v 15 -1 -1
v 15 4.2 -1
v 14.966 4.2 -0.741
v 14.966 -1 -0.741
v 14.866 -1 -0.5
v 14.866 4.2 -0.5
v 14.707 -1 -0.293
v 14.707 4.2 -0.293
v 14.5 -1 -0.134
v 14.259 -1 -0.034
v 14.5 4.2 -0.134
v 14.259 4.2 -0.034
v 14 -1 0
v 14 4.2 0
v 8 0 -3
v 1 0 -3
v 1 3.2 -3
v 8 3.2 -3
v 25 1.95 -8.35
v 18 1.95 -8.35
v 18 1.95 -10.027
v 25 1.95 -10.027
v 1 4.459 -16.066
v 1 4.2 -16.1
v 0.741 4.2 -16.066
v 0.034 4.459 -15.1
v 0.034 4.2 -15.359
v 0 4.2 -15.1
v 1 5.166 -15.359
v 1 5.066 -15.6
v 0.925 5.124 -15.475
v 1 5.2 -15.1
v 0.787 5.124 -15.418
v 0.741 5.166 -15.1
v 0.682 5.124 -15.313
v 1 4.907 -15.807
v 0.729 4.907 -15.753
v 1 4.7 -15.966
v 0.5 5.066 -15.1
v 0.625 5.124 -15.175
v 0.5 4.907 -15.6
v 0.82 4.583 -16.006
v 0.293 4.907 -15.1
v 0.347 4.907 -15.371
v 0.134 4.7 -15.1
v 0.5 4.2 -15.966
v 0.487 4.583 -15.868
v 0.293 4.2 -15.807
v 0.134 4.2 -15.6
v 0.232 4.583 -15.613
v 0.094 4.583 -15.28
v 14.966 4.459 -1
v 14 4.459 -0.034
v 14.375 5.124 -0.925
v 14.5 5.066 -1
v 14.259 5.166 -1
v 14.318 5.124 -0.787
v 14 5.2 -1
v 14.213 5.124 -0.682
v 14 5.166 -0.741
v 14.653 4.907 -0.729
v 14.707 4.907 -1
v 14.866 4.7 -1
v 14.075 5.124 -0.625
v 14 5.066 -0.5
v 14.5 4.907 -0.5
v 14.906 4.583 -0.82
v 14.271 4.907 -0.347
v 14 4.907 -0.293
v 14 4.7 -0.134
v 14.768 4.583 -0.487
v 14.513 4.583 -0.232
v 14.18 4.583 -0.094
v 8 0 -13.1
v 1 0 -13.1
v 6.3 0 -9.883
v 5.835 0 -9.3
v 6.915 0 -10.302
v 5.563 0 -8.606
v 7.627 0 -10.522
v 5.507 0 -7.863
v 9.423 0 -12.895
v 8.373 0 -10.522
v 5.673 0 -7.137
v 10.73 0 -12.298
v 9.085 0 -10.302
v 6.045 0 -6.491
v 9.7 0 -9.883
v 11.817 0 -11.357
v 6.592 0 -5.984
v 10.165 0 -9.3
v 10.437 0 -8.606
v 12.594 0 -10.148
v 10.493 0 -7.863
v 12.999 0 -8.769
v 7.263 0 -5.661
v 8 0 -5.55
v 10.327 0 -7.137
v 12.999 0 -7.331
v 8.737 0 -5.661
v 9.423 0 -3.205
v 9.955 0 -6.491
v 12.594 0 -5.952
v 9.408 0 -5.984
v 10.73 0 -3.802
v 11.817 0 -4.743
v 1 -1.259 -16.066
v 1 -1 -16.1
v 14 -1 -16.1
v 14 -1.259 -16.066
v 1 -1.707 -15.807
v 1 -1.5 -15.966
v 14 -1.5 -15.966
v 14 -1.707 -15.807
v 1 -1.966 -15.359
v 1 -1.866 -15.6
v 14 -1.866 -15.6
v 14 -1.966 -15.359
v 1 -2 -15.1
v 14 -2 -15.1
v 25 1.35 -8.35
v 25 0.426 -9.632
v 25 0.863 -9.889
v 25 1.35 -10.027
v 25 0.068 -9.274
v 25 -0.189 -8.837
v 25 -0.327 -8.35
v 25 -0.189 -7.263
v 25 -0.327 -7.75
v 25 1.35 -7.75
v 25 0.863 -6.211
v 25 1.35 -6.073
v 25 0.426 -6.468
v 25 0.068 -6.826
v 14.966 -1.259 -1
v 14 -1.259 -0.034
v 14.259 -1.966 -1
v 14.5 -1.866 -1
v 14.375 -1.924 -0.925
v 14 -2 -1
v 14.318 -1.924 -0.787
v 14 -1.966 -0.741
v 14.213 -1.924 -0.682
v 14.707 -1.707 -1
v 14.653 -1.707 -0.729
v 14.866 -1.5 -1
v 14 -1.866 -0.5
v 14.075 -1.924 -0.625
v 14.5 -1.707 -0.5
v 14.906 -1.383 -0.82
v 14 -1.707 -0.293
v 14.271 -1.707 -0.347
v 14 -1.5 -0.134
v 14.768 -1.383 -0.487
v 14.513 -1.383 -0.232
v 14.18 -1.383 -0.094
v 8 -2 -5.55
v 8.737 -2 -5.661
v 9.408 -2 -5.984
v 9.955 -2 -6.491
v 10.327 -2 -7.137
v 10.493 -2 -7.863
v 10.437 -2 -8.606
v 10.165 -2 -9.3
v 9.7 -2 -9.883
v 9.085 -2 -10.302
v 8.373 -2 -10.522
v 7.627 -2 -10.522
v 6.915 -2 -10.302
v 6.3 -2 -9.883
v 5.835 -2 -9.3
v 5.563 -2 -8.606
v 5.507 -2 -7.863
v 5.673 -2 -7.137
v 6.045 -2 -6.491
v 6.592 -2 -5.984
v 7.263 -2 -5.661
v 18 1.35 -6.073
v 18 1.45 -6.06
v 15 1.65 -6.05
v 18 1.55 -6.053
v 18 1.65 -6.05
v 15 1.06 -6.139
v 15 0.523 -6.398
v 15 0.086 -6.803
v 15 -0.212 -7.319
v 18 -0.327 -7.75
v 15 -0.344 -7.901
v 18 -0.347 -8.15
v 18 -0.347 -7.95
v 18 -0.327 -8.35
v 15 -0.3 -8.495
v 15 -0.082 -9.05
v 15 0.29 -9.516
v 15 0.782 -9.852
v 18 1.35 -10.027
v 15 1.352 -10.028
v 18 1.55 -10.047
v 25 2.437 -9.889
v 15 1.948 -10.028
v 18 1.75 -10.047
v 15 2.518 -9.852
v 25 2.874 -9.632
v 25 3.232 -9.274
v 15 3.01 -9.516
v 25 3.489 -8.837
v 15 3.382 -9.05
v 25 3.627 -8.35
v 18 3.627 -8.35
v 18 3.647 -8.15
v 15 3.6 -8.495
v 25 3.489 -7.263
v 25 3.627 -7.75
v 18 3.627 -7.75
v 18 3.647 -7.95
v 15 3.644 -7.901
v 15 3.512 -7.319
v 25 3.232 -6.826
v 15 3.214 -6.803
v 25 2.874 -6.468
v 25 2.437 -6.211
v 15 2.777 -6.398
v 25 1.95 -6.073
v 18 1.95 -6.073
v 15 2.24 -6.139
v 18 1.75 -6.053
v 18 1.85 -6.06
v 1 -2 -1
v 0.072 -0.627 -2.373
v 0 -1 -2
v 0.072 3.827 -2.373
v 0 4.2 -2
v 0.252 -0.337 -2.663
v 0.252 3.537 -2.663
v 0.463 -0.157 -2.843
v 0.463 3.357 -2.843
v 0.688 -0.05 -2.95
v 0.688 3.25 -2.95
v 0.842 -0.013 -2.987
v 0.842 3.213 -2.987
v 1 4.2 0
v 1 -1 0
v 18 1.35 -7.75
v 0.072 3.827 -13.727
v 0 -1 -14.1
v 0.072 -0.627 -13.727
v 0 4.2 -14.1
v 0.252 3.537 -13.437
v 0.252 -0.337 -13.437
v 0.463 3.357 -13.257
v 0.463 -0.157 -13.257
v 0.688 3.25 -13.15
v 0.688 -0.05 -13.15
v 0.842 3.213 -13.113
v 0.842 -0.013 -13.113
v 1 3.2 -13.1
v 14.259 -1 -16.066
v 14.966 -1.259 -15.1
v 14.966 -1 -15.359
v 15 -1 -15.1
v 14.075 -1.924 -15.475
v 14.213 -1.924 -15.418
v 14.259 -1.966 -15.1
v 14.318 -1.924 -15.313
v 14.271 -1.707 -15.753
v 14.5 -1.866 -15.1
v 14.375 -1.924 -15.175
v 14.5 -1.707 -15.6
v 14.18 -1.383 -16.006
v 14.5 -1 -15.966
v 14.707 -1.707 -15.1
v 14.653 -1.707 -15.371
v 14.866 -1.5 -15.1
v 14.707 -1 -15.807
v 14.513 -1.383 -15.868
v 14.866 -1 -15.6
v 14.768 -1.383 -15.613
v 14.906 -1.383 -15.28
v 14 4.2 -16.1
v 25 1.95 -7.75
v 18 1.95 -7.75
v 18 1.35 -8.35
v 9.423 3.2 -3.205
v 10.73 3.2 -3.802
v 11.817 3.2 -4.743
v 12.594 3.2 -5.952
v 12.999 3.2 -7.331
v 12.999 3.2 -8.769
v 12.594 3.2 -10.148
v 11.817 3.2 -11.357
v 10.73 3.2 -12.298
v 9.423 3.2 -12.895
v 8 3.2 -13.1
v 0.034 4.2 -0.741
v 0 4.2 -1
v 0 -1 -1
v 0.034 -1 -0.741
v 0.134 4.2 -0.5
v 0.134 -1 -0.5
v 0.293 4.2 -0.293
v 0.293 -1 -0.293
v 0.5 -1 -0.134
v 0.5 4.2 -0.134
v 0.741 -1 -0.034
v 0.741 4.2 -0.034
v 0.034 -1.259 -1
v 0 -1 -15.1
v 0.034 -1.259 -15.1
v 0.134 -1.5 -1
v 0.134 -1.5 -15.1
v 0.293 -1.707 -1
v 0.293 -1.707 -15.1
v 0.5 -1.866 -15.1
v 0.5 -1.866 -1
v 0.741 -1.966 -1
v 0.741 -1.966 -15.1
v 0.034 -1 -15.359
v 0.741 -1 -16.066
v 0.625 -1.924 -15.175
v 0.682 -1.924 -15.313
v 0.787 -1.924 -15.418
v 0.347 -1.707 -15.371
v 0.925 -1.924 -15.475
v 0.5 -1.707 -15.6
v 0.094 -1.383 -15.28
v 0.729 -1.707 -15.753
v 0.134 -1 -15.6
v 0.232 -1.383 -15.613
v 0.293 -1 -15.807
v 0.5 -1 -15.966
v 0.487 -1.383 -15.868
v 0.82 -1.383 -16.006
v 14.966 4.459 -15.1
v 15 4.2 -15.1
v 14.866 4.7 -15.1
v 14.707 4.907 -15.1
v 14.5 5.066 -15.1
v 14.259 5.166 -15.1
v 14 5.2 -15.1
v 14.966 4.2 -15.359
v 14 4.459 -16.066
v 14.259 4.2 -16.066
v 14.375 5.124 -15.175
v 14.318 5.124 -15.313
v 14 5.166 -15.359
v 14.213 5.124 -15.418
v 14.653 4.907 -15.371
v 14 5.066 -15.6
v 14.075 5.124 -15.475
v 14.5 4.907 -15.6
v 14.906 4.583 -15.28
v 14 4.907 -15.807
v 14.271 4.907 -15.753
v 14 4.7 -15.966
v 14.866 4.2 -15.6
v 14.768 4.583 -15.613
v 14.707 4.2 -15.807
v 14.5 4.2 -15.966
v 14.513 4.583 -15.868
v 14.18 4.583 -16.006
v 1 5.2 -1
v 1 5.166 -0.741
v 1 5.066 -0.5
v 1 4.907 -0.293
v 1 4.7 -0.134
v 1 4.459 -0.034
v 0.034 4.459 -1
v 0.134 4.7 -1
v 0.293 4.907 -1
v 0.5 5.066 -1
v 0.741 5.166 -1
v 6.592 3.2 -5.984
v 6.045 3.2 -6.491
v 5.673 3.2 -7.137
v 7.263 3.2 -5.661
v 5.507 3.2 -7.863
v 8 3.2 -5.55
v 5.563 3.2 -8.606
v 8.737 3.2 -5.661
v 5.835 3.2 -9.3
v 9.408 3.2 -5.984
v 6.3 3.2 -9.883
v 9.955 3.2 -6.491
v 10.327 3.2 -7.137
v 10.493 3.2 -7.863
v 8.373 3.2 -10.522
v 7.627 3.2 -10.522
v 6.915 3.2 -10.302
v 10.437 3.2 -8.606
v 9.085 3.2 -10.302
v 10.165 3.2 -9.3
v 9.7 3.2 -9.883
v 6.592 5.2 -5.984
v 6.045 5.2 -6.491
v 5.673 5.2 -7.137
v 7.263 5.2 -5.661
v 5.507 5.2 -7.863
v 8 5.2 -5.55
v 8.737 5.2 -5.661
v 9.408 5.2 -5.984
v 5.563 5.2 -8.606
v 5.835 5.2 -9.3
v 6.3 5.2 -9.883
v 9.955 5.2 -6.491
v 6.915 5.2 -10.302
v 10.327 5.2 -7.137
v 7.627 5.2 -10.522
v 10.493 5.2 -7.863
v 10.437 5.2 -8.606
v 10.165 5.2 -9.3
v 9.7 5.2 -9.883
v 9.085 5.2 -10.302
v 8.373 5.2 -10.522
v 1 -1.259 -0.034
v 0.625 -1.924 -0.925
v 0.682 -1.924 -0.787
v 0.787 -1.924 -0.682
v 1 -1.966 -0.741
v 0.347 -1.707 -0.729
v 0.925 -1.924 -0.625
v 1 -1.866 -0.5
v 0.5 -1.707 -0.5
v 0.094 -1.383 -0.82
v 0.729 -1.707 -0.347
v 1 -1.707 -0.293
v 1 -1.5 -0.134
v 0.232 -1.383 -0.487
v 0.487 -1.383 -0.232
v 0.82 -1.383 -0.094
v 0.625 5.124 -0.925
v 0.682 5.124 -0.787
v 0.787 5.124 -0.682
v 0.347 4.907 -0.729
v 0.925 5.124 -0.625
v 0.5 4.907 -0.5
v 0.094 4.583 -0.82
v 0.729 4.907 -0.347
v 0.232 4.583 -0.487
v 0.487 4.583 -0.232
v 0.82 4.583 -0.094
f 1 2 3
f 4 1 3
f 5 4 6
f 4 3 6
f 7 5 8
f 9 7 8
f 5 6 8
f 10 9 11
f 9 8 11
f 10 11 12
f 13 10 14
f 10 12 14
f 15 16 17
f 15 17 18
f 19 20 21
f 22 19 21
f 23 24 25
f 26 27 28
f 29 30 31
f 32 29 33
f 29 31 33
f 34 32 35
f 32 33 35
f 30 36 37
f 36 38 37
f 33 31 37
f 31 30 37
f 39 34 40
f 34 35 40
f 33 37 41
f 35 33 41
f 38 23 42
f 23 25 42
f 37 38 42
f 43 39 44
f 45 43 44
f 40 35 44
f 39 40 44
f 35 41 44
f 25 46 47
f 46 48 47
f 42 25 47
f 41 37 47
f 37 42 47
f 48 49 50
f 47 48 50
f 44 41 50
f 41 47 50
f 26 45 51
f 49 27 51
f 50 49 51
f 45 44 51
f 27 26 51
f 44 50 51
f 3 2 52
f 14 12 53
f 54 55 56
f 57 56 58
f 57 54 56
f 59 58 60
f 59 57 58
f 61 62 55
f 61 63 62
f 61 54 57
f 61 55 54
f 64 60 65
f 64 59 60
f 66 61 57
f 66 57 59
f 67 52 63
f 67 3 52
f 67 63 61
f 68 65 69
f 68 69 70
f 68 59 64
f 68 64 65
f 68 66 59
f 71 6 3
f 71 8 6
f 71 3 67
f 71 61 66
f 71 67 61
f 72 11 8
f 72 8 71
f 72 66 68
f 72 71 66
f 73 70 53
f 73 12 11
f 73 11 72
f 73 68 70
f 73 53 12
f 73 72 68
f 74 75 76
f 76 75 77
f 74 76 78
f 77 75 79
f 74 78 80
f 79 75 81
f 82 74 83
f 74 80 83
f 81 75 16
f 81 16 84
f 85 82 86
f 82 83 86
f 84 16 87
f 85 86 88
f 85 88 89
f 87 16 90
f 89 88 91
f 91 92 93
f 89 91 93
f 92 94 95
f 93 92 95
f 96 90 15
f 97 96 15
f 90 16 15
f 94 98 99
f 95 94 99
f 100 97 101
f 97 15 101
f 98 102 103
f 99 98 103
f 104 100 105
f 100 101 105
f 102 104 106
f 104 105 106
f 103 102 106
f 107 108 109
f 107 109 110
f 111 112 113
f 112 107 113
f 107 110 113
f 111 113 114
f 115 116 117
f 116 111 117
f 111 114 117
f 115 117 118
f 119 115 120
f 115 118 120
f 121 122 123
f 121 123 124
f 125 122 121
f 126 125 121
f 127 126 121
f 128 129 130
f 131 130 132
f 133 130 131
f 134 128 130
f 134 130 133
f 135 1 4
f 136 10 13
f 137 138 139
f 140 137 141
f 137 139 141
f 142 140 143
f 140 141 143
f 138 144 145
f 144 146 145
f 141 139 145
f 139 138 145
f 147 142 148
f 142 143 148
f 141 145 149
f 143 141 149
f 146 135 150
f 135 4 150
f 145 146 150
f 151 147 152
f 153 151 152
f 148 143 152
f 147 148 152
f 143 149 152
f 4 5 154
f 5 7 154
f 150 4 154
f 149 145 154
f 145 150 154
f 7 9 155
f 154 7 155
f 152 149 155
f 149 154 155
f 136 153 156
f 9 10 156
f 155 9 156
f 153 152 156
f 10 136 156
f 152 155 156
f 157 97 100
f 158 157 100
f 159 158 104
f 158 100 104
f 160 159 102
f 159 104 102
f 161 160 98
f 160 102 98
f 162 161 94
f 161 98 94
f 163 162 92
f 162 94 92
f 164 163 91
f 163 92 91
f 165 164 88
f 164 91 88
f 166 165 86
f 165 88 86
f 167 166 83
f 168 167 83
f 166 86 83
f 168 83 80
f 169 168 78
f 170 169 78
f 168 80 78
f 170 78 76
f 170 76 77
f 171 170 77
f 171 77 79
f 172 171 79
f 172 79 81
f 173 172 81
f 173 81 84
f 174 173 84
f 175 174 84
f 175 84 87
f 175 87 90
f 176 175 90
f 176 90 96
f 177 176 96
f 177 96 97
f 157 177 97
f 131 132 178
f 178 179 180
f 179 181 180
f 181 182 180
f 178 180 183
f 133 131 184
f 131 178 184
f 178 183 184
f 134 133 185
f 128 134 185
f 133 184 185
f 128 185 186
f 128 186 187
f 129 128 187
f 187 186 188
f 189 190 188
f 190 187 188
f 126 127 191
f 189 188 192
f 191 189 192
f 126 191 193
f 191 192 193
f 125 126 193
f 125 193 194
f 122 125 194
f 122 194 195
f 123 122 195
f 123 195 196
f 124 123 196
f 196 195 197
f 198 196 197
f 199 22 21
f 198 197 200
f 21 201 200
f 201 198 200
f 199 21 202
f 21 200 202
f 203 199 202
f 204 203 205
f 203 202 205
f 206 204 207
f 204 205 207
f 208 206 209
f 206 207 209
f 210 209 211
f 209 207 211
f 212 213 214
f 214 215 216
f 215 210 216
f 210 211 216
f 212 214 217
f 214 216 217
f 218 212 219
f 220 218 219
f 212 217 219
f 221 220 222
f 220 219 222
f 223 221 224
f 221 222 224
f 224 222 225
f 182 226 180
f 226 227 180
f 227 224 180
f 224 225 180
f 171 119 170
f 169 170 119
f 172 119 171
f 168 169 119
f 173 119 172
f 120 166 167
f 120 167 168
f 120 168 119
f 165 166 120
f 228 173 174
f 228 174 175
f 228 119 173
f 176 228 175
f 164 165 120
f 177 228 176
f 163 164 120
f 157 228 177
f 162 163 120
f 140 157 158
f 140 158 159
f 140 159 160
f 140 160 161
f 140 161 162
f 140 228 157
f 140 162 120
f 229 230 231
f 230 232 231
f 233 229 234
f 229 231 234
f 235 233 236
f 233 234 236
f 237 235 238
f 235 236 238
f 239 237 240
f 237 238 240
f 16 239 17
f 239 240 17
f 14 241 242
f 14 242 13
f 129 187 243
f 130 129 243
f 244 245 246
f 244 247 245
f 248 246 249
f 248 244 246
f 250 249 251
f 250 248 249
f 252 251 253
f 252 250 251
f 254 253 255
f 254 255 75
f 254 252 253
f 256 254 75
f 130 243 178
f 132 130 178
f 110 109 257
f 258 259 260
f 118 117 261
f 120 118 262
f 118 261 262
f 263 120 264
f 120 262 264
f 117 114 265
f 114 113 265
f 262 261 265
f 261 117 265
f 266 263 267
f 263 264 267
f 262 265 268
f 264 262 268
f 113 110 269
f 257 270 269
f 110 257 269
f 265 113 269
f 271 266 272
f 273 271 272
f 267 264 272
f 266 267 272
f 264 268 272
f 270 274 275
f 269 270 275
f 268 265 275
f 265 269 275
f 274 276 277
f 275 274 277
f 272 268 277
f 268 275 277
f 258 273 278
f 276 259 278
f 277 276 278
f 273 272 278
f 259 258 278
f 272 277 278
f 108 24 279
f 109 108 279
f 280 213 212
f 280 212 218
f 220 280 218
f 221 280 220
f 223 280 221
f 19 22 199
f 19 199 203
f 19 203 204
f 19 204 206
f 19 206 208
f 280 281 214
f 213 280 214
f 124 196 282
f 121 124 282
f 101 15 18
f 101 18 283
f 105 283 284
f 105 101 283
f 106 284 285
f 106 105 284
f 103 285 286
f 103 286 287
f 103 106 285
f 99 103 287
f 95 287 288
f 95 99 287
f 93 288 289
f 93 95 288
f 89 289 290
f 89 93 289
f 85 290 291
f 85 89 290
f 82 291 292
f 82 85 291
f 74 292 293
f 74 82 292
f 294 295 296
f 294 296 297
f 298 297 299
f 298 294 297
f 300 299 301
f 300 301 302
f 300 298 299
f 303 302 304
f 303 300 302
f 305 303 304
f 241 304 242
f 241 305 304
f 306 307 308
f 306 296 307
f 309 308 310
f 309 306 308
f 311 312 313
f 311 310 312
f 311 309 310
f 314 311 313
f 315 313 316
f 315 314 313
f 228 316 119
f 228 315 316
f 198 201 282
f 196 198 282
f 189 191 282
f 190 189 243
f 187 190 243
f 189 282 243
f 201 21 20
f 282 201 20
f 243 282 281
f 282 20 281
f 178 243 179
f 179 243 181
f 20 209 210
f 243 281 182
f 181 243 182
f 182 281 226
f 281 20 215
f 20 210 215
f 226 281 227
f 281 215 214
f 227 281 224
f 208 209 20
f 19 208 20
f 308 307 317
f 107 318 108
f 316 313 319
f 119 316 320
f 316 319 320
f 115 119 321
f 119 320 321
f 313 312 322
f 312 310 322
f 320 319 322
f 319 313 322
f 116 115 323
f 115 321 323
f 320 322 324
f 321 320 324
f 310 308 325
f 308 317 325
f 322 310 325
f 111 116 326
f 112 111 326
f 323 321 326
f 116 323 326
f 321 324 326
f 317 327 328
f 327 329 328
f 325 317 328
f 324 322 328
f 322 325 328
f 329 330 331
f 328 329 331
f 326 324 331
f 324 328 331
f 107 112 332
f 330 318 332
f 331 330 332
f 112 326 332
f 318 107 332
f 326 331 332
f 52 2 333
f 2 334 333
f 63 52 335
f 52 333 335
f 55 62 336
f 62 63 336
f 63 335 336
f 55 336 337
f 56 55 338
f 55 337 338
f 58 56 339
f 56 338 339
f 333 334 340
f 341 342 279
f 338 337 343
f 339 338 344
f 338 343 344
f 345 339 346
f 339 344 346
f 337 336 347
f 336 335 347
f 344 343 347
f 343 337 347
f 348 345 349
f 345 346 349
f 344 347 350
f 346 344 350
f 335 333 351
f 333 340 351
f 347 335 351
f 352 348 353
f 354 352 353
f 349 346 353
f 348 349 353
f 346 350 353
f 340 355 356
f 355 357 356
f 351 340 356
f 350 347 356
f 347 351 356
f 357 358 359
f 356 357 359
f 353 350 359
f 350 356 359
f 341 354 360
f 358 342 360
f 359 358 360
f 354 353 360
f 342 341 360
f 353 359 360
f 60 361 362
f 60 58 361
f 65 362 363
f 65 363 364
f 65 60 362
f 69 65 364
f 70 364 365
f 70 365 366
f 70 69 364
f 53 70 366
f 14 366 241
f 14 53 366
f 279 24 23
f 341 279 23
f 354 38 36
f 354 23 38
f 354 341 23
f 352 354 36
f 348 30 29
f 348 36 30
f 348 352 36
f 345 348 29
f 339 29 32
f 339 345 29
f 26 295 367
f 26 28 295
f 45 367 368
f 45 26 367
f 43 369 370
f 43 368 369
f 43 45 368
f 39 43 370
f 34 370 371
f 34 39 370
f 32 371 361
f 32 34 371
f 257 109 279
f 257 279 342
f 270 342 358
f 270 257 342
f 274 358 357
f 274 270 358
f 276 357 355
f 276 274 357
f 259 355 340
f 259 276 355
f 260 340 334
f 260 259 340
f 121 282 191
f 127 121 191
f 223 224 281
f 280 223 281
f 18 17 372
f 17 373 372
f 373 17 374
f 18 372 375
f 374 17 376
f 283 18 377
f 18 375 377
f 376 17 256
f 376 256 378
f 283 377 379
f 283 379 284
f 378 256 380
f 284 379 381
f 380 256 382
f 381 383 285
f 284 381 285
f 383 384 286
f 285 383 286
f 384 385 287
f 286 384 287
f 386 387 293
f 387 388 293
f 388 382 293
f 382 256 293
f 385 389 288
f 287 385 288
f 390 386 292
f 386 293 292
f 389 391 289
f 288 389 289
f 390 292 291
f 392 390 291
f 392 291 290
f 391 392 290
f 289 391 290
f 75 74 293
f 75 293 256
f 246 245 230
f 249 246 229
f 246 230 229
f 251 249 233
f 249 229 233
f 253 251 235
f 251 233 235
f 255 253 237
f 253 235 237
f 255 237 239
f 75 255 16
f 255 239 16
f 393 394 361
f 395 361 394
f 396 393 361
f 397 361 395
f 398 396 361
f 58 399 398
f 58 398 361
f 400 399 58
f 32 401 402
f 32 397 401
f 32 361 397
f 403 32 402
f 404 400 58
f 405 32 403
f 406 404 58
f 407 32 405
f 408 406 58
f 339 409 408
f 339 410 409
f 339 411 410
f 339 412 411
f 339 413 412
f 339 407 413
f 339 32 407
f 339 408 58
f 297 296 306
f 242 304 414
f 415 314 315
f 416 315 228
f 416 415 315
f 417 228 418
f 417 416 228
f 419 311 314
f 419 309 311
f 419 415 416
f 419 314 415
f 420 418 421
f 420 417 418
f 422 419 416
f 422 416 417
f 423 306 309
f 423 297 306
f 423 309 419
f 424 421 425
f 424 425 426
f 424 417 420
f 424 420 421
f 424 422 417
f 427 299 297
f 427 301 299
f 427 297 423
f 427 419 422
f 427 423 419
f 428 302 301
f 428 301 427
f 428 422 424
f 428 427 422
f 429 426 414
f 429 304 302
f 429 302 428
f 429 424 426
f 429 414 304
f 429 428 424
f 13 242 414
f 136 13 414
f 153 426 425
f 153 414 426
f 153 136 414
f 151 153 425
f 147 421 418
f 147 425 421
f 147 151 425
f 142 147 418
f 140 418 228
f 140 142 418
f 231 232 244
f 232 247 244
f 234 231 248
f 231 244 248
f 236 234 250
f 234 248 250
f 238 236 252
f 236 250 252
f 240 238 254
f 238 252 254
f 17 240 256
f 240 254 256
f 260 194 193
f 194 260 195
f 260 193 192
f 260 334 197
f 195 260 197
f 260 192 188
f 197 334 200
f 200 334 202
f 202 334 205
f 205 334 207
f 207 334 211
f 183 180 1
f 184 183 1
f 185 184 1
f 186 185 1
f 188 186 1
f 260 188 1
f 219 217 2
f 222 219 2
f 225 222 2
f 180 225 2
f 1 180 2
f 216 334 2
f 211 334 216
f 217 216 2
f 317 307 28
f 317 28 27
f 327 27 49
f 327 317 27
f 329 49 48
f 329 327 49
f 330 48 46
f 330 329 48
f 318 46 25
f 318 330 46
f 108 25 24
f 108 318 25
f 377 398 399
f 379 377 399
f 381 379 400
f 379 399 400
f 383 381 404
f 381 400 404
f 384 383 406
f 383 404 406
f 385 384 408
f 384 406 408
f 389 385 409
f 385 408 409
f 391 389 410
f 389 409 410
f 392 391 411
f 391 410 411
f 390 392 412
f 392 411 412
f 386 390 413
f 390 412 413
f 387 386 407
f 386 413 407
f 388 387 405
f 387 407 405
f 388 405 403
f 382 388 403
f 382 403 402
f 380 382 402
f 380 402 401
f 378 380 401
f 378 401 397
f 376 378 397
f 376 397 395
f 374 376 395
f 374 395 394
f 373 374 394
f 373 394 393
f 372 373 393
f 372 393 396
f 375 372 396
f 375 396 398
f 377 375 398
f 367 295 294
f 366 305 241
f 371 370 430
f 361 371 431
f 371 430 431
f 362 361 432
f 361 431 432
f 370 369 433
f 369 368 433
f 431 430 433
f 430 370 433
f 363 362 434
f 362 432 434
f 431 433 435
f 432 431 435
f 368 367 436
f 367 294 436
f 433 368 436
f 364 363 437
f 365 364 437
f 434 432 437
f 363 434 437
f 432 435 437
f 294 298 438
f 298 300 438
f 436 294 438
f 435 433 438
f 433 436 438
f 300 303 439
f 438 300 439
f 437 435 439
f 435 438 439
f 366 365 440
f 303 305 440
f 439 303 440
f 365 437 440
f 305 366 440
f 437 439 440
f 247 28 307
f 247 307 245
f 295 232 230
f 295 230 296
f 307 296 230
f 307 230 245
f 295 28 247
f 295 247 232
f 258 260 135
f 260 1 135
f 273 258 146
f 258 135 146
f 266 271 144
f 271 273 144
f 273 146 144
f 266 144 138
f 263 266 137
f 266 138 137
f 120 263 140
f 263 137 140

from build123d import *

# Parameters (mm, degrees)
BOSS_EXTRUDE1_DEPTH = 3.2
SKETCH2_W           = 15
SKETCH2_H           = 16.1
BOSS_EXTRUDE2_DEPTH = 2
SKETCH3_W           = 15
SKETCH3_H           = 16.1
BOSS_EXTRUDE3_DEPTH = 2
FILLET1_R           = 1
SKETCH4_R           = 2
BOSS_EXTRUDE4_DEPTH = 10
CUT_EXTRUDE1_START  = -7
CUT_EXTRUDE1_DEPTH  = 7
SKETCH6_R           = 2.5
CUT_EXTRUDE2_DEPTH  = 31.594934221


with BuildPart() as part:
    # Sketch1 → Boss-Extrude1 (new body)
    with BuildSketch(Plane(origin=(0, 0, 0), x_dir=(1, 0, 0), z_dir=(0, 1, 0))):
        with BuildLine():
            Line((0, 13.1), (0, 16.1))
            Line((0, 16.1), (15, 16.1))
            Line((15, 16.1), (15, 0))
            Line((15, 0), (0, 0))
            Line((0, 0), (0, 3))
            Line((0, 3), (8, 3))
            ThreePointArc((8, 3), (13.05, 8.05), (8, 13.1))
            Line((8, 13.1), (0, 13.1))
        make_face()
    extrude(amount=BOSS_EXTRUDE1_DEPTH)

    # Sketch2 → Boss-Extrude2 (add)
    with BuildSketch(Plane(origin=(0, 3.2, 0), x_dir=(1, 0, 0), z_dir=(0, 1, 0))):
        with Locations((7.5, 8.05)):
            Rectangle(SKETCH2_W, SKETCH2_H)
    extrude(amount=BOSS_EXTRUDE2_DEPTH)

    # Sketch3 → Boss-Extrude3 (add)
    with BuildSketch(Plane.XZ):
        with Locations((7.5, -8.05)):
            Rectangle(SKETCH3_W, SKETCH3_H)
    extrude(amount=BOSS_EXTRUDE3_DEPTH)

    # Fillet1
    fillet1_edges = [part.edges().sort_by_distance(p)[0] for p in [
        (0, 1.6, -3),
        (0, 1.6, -13.1),
        (0, 1.6, -16.1),
        (15, 1.6, -16.1),
        (15, 1.6, 0),
        (0, 1.6, 0),
        (0, 3.2, -8.05),
        (15, 5.2, -8.05),
        (7.5, 5.2, -16.1),
        (0, 5.2, -8.05),
        (7.5, 5.2, 0),
        (0, 0, -8.05),
        (0, -2, -8.05),
        (7.5, -2, -16.1),
        (15, -2, -8.05),
        (7.5, -2, 0),
    ]]
    fillet(fillet1_edges, radius=FILLET1_R - 0.0001)  # a hair under: the kernel refuses the full size

    # Sketch4 → Boss-Extrude4 (add)
    with BuildSketch(Plane(origin=(15, 0, 0), x_dir=(0, 0, -1), z_dir=(1, 0, 0))):
        with Locations(Location((8.05, 1.65, 0), (0, 0, 180))):
            Circle(SKETCH4_R)
    extrude(amount=BOSS_EXTRUDE4_DEPTH)

    # Sketch5 → Cut-Extrude1 (cut)
    with BuildSketch(Plane(origin=(25, 0, 0), x_dir=(0, 0, -1), z_dir=(1, 0, 0)).offset(CUT_EXTRUDE1_START)):
        with BuildLine():
            Line((6.072628007, 1.95), (7.75, 1.95))
            Line((7.75, 1.95), (7.75, 3.627371993))
            ThreePointArc((7.75, 3.627371993), (8.05, 3.65), (8.35, 3.627371993))
            Line((8.35, 3.627371993), (8.35, 1.95))
            Line((8.35, 1.95), (10.027371993, 1.95))
            ThreePointArc((10.027371993, 1.95), (10.05, 1.65), (10.027371993, 1.35))
            Line((10.027371993, 1.35), (8.35, 1.35))
            Line((8.35, 1.35), (8.35, -0.327371993))
            ThreePointArc((8.35, -0.327371993), (8.05, -0.35), (7.75, -0.327371993))
            Line((7.75, -0.327371993), (7.75, 1.35))
            Line((7.75, 1.35), (6.072628007, 1.35))
            ThreePointArc((6.072628007, 1.35), (6.05, 1.65), (6.072628007, 1.95))
        make_face()
    extrude(amount=CUT_EXTRUDE1_DEPTH, mode=Mode.SUBTRACT)

    # Sketch6 → Cut-Extrude2 (cut, through all)
    with BuildSketch(Plane(origin=(0, 5.2, 0), x_dir=(1, 0, 0), z_dir=(0, 1, 0))):
        with Locations(Location((8, 8.05, 0), (0, 0, 270))):
            Circle(SKETCH6_R)
    extrude(amount=-CUT_EXTRUDE2_DEPTH, mode=Mode.SUBTRACT)


solid = part.part
